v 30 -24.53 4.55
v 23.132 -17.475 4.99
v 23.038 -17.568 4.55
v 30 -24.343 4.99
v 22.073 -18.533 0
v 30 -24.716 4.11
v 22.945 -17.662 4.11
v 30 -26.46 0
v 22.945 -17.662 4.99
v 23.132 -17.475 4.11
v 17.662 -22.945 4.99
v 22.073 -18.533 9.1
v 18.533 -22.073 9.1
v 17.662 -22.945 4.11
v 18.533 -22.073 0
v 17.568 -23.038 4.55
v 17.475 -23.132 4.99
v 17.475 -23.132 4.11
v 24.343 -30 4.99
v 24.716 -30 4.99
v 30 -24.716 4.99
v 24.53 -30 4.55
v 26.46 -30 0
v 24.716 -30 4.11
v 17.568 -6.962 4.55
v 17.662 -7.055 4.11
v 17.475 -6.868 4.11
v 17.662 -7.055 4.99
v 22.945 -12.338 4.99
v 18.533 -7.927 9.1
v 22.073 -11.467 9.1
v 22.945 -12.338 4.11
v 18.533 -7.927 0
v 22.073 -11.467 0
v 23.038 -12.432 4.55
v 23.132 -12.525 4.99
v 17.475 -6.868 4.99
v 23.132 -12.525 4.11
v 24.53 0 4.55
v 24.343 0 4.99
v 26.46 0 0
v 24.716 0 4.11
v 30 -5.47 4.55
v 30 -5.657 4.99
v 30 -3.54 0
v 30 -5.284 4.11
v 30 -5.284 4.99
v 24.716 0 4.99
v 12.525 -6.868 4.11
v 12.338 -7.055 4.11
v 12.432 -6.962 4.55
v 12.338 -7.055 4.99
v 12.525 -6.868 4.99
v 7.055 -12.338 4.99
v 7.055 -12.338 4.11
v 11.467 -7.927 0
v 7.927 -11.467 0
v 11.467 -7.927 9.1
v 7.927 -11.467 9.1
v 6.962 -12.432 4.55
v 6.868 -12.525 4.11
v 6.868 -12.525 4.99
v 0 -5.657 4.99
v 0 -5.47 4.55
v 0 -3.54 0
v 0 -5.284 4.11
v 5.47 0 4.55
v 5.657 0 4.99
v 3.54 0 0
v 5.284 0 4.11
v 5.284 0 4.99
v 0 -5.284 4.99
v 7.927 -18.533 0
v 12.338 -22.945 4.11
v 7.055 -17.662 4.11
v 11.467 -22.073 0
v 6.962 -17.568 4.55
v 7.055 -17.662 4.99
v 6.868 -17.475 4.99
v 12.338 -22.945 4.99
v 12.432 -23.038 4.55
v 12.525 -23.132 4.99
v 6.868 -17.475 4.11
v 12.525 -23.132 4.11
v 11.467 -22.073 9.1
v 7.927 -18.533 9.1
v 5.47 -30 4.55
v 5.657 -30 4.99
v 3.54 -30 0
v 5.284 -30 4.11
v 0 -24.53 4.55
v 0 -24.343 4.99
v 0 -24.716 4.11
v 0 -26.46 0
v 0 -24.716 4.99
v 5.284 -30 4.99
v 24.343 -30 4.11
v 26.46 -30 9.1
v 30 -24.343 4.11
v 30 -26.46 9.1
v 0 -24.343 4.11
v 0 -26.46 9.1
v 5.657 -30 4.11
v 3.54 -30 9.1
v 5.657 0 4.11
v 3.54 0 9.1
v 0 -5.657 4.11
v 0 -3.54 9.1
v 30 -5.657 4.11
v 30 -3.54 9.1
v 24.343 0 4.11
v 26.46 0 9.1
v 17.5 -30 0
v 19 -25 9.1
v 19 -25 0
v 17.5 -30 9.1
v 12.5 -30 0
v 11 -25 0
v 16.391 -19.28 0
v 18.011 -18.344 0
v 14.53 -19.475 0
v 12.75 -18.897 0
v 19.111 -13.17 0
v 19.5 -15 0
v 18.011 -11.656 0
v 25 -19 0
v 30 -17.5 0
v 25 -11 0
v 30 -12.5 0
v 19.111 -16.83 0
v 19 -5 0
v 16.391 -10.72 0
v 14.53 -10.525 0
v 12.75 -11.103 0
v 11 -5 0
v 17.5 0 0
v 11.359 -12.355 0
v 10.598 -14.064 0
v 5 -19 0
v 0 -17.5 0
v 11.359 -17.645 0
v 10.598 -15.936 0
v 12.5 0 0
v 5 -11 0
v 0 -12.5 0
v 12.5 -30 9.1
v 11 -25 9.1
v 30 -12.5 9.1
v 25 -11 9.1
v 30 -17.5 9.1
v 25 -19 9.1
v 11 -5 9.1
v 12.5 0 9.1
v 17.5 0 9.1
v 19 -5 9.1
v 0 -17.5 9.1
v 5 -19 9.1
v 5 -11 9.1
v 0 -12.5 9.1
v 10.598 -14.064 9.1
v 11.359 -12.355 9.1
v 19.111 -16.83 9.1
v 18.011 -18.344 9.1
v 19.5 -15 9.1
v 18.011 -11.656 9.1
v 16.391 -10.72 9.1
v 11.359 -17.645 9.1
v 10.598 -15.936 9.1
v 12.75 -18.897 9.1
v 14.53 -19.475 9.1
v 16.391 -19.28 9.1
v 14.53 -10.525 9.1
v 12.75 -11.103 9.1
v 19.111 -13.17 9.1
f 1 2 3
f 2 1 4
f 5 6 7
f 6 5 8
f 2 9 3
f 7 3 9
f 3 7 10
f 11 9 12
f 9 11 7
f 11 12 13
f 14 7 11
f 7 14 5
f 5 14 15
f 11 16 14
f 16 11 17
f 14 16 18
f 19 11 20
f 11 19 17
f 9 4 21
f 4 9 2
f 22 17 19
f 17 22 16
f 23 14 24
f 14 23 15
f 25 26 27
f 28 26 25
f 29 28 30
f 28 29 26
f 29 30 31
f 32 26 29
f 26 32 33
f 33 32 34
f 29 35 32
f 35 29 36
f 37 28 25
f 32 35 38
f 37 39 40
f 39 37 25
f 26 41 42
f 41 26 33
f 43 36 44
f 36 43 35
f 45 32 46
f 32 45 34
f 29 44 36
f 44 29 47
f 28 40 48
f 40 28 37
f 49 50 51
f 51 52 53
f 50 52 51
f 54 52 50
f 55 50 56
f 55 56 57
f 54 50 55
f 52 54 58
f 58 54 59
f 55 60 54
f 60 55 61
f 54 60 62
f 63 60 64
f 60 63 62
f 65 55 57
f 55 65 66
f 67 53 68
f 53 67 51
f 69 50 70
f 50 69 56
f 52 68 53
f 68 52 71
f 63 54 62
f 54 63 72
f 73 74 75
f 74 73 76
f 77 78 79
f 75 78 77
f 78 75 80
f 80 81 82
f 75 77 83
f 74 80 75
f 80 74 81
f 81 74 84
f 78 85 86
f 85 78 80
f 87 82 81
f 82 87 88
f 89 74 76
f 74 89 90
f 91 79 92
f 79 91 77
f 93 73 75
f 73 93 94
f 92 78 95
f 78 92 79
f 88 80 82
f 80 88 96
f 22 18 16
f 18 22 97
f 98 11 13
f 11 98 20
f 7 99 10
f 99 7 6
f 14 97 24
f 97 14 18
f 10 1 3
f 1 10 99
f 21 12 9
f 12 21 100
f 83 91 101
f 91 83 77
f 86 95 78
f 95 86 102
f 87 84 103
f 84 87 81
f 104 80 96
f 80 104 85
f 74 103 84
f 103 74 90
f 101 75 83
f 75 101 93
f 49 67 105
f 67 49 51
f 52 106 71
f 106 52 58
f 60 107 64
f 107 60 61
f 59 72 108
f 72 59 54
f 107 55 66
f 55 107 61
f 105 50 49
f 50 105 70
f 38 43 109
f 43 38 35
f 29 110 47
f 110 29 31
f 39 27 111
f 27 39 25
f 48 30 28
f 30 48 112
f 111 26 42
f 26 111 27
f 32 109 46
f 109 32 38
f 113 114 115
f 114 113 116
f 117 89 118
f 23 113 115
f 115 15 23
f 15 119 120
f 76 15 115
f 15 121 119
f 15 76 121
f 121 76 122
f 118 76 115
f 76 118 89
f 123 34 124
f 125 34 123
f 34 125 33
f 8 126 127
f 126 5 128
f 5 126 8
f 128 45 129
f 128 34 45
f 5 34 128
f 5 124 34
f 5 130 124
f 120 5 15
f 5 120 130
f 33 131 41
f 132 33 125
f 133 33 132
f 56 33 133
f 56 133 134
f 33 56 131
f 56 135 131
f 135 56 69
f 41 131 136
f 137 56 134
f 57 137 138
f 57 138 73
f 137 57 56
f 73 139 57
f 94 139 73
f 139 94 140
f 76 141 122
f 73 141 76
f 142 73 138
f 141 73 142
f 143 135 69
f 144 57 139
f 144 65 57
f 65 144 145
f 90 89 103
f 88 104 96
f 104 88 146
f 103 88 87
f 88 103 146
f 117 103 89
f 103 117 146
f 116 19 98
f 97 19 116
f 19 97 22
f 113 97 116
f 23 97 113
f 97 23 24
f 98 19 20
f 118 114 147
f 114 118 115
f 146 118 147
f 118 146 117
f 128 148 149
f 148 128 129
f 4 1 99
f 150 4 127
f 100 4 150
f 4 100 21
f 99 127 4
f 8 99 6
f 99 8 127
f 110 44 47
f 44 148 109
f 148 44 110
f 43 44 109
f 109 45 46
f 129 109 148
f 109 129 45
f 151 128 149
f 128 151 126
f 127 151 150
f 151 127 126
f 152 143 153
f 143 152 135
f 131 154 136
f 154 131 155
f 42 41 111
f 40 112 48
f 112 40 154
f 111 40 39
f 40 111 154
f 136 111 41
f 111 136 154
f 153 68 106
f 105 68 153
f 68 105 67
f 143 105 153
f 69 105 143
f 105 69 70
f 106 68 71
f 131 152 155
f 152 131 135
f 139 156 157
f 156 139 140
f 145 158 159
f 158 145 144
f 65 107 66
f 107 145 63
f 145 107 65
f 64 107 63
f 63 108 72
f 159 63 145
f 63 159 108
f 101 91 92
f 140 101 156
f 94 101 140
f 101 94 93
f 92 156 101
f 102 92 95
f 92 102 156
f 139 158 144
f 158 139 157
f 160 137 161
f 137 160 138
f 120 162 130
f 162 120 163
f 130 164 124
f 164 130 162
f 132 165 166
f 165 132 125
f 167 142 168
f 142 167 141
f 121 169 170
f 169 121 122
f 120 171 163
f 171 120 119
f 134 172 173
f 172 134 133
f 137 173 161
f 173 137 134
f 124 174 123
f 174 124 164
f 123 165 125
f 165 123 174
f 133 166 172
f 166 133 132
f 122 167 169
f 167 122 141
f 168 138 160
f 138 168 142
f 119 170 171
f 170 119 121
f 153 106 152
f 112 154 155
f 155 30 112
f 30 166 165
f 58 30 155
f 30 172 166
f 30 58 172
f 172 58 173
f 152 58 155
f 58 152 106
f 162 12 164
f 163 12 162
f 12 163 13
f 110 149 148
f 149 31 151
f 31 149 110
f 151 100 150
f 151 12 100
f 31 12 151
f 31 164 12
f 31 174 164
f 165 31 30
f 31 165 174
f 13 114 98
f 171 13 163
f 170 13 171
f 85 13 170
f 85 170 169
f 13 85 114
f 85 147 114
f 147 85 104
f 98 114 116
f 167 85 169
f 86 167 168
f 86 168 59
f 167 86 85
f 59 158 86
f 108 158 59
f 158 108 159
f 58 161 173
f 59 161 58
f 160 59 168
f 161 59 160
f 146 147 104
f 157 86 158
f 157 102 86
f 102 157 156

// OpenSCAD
// file: ../../globals.scad
/*
Most things in this file is represented as one millimeter, so keep that in mind while changing things.
Some of the setting are not mm but at variables that you can set, such as 2*x=2x and you are setting what x is.
I will try to specify when things are variables and not exact measurements.
*/

// printer slop, used by snappy parts
slop = 0.15;

//Virindi settings
dovetail_male_width_scale = 0.98;
dovetail_male_height_scale = 0.91;

obj_leg = 30;
leg_length = 5.5;
small_number = 0.001;
metal_core_rode_global = 5;


///////////////// number of holes /////////////////////
z_hole_number = 8;
other_holes = 8;

///////////////// Pins /////////////////////

//pins that poke out
ball_size = 10;
pin_height = 20;
pin_diameter = 6;


//holes
hole_ball_size = ball_size;
hole_pin_height = pin_height;
hole_pin_diameter = pin_diameter;

///////////////// Z THINGS /////////////////////

berring_slot_width = 7.5;
berring_slot_depth = 6.5;
metal_core_rode = 5;

///////////////// X THINGS /////////////////////

//male dove tails
max_width=8;
min_width=5;
depth=5;
height=obj_leg/2;

//female dove tails, this is found on the y mounts
girl_max_width=11;
girl_min_width=5;
girl_depth=5;
girl_height=obj_leg;


///////////////// Y THINGS /////////////////////
/*
The Y is so normal that all of those global variables at the top should change all of the setting in it, this section is set her incase there are variables set in the future development of this project.
*/

// stepper
motor_side_length = 43.2;
motor_bolt_hole_distance = 31;
motor_center_hole = 23;
motor_shaft_dia = 5;
motor_shaft_hole_dia = 5+2*slop;

// bolts etc.
bolt_hole_dia = 3+2*slop;
bolt_head_hole_dia = 5.8;

m3_nut_side = 5.65;

// threaded rod
lifter_rod_diam = 9.86;
hole_threaded_rod = lifter_rod_diam+2*slop;
// file: ../../include.scad
use <globals.scad>

//////////////////      END SECTION       //////////////////

	module added_pins(){
		difference(){
			union(){
				translate([30/(15/4),obj_leg*leg_length,30/(15/4)]) pin();
				translate([30/(15/4)+14.5,obj_leg*leg_length,30/(15/4)+14]) pin();
			}
			union(){
							translate([30/(15/4)+13.5,obj_leg*leg_length-20,30/(15/4)+5])cube(size=[2,40,15]);
							translate([30/(15/4)+7.5,obj_leg*leg_length-20,30/(15/4)+15])rotate([0,90,0]) cube(size=[2,40,15]);	

							translate([30/(15/4)-1,obj_leg*leg_length-20,30/(15/4)-8])cube(size=[2,40,15]);
							translate([30/(15/4)-10,obj_leg*leg_length-20,30/(15/4)+1])rotate([0,90,0]) cube(size=[2,40,15]);
			}
		}
	}
	module taken_pins() {
		translate([30/(15/4)+14,obj_leg*leg_length-10,30/(15/4)]) mirror_pin();
		translate([30/(15/4),obj_leg*leg_length-10,30/(15/4)+15]) mirror_pin();
	}


//////////////////      OTHER STUFF       //////////////////

	module holes() {
		rotate([0,0,90]) for(y=[0:other_holes])
		translate([obj_leg+y*15,-15.5,7.5]) union() {
			translate([7.5,0,15]) hole_up();
			hole_down();
		}
	}
	module extend_holes() {
	module top(){
		rotate([0,0,90]) for(y=[0:other_holes+1])
		translate([(30/4)+y*15,-15.5,7.5]) union() {
			translate([7.5,0,15]) hole_up();
		}
	}
	module bottom(){
		rotate([0,0,90]) for(y=[0:other_holes+2])
		translate([(30/4)+y*15,-15.5,7.5]) union() {
			hole_down();
		
}
	}
	union(){
		top();
		bottom();
	}
	}

	module hole() {
		union() {
			rotate([90, 90, 0]) cylinder(h=40, d=hole_pin_diameter, center=true);
			translate([0,7.5,0]) sphere(d=hole_ball_size);
			translate([0,-6,0]) sphere(d=hole_ball_size);
		}
	}
	module hole_up() {
		union() {
			rotate([90, 90, 0]) cylinder(h=40, d=hole_pin_diameter, center=true);
			translate([0,7.5,10]) cylinder(h=hole_pin_height, d=hole_pin_diameter, center=true);
			translate([0,-6,10]) cylinder(h=hole_pin_height, d=hole_pin_diameter, center=true);
			translate([0,7.5,0]) sphere(d=hole_ball_size);
			translate([0,-6,0]) sphere(d=hole_ball_size);
		}
	}
	module hole_down() {
		union() {
			rotate([90, 90, 0]) cylinder(h=40, d=hole_pin_diameter, center=true);
			translate([0,7.5,-10]) cylinder(h=hole_pin_height, d=hole_pin_diameter, center=true);
			translate([0,-6,-10]) cylinder(h=hole_pin_height, d=hole_pin_diameter, center=true);
			translate([0,7.5,0]) sphere(d=hole_ball_size);
			translate([0,-6,0]) sphere(d=hole_ball_size);
		}
	}
	module pin() {
		union() {
			rotate([90, 90, 0]) cylinder(h=pin_height, d=pin_diameter, center=true);
			translate([0,7.5,0]) sphere(d=ball_size);
		}
	}

	module mirror_pin() {
		rotate([90, 90, 0]) cylinder(h=hole_pin_height+small_number, d=hole_pin_diameter, center=true);
		translate([0,-(pin_height-(ball_size/2)),0]) sphere(d=ball_size);
	}


//////////////////      SOME RACK AND Z THINGS       //////////////////

module z_holes() {
    rotate([0,-90,0]) for(z=[0:z_hole_number])
    translate([22.5+z*15,16,-12])
        hole();
}

module pin_cuts() {
	union(){
		cube(size=[2,10,40], center=true);
		rotate([0,0,90]) cube(size=[2,10,40], center=true);
	}
}
module pin_uncut() {
	union(){
		rotate([0, 0, 90]) cylinder(h=hole_pin_height, d=hole_pin_diameter, center=true);
		translate([0,0,10]) sphere(d=ball_hole);
	}
}


module pin_out() {
	union(){
		rotate([0, 0, 90]) cylinder(h=pin_height, d=pin_diameter, center=true);
		translate([0,0,10]) sphere(d= ball_size);
	}
}


module pins_z(){
	difference() {
		pin_out();
		pin_cuts();
	}
}

module rounded_cube(width,depth,height){
    hull(){
        translate([width/2-diameter/2,depth/2-diameter/2,height/2-diameter/2]) sphere(d=diameter);
        translate([width/2-(diameter/2),depth/2-(diameter/2),-height/2+(diameter/2)]) sphere(d=diameter);
        translate([-width/2+diameter/2,depth/2-diameter/2,height/2-diameter/2]) sphere(d=diameter);
        translate([-width/2+(diameter/2),depth/2-(diameter/2),-height/2+(diameter/2)]) sphere(d=diameter);
        
        translate([width/2-diameter/2,-depth/2+diameter/2,height/2-diameter/2]) sphere(d=diameter);
        translate([width/2-(diameter/2),-depth/2+(diameter/2),-height/2+(diameter/2)]) sphere(d=diameter);
        translate([-width/2+diameter/2,-depth/2+diameter/2,height/2-diameter/2]) sphere(d=diameter);
        translate([-width/2+(diameter/2),-depth/2+(diameter/2),-height/2+(diameter/2)]) sphere(d=diameter);
    }
}

module motor_shaft_hole(h=10) {
    difference() {
        cylinder(d=motor_shaft_hole_dia, h=h);
        translate([0,4.5,h/2]) cube([5,5,h], center=true); 
    }
}
//////////////////      RACK AND SLIDE     ///////////////////

module straight_pins() {
	for(z=[0:((((obj_leg*leg_length)*2)-(obj_leg*2))/3)/14.5]) rotate([-90,0,0]) translate([z*15,30/(15/4),14]) pins_z();
	for(z=[0:((((obj_leg*leg_length)*2)-(obj_leg*2))/3)/14.5]) rotate([-90,0,0]) translate([z*15,30/(15/4)-14,14]) pins_z();
}
module stagger_pins() {
	for(z=[0:((((obj_leg*leg_length)*2)-(obj_leg*2))/3)/14.5]) rotate([-90,0,0]) translate([z*15,30/(15/4),14]) pins_z();
	for(z=[0:((((obj_leg*leg_length)*2)-(obj_leg*2))/3)/14.5]) rotate([-90,0,0]) translate([z*15+7,30/(15/4)-14,14]) pins_z();
}


//////////////////      DOVE TAIL       //////////////////

module male_dovetail(height) {
	dovetail_3d(max_width,min_width,depth,height);
}

module dovetail_3d(max_width=11, min_width=5, depth=5, height=30) {
	linear_extrude(height=height, convexity=2)
		dovetail_2d(max_width,min_width,depth);
}

module dovetail_2d(max_width=11, min_width=5, depth=5) {
	angle=atan((max_width/2-min_width/2)/depth);
	echo("angle: ", angle);
	polygon(paths=[[0,1,2,3,0]], points=[[-min_width/2,0], [-max_width/2,depth], [max_width/2, depth], [min_width/2,0]]);
}

//bow tie
	module tie_end(height){
				rotate([0,0,0]) translate([0,-0.01,((obj_leg/2)/2)]) male_dovetail(height);
				rotate([0,90,0]) translate([0,-0.01,((obj_leg/2)/2)]) male_dovetail(height);
				rotate([0,180,0]) translate([0,-0.01,((obj_leg/2)/2)]) male_dovetail(height);
				rotate([0,-90,0]) translate([0,-0.01,((obj_leg/2)/2)]) male_dovetail(height);
	}

module bow_support(){
	difference(){
		intersection(){
			translate([-15,0,-15]) cube([30,9,30]);
			scale([1.05,1.05,1.05]) rotate([0,45,0]) tie_end();
		}
		cube([29.2,29.2,29.2], center=true);
	}
}

	module wrap(units){
	for (y = [-1:units-2]) // two iterations, z = -1, z = 1
	{
			translate([15, (y*30)+15, 15]){
			for (r = [0:4]) // two iterations, z = -1, z = 1
			{
				rotate([0,r*90,0]) translate([0,15,15]) rotate([-90,0,0])male_dovetail(height=30);
			}
		}
	}
	}
// file: ../printed_structural/extension.scad
include <../../include.scad>;
include <../../globals.scad>;
metal_rod_size = 9;
//support = true;
//min number of units is 2
//max is however large your printer can print

module extension(units = 4){
	
	module added(){
			translate([0,0,0]) cube([30,30*units,30]);
	}

	module subtracted(){
	translate([15,0,15]) rotate([0,45,0]) tie_end();
	translate([15,units*30,15]) rotate([0,45,0]) rotate([0,0,180]) tie_end();
	translate([15,15,15]) rotate([90,0,0]) cylinder(h=5000, d= metal_rod_size, center=true);

	for (y = [-1:units]) // two iterations, z = -1, z = 1
	{
			translate([15, (y*30)+15, 15]){
			for (r = [0:4]) // two iterations, z = -1, z = 1
			{
				rotate([0,r*90,0]) translate([0,15,15]) rotate([-90,0,0])male_dovetail(height=30);
			}
		}
	}

	} //subtracted
	difference(){
		added();
		subtracted();
	}	
} //module extension

module extension_finished(units = 4, support = false){
		rotate([90,0,0]) extension(units);
    
    if (support==true)
    {
        translate([0,0,5/2]) cylinder(h=5, d=6, center=true);
        translate([30,0,5/2]) cylinder(h=5, d=6, center=true);
        translate([0,-30,5/2]) cylinder(h=5, d=6, center=true);
        translate([30,-30,5/2]) cylinder(h=5, d=6, center=true);
    }
}

//extension_finished(units=8.333);
// main file
use <../printed_structural/extension.scad>

extension_finished(units=(10-0.9)/30, support=false);
